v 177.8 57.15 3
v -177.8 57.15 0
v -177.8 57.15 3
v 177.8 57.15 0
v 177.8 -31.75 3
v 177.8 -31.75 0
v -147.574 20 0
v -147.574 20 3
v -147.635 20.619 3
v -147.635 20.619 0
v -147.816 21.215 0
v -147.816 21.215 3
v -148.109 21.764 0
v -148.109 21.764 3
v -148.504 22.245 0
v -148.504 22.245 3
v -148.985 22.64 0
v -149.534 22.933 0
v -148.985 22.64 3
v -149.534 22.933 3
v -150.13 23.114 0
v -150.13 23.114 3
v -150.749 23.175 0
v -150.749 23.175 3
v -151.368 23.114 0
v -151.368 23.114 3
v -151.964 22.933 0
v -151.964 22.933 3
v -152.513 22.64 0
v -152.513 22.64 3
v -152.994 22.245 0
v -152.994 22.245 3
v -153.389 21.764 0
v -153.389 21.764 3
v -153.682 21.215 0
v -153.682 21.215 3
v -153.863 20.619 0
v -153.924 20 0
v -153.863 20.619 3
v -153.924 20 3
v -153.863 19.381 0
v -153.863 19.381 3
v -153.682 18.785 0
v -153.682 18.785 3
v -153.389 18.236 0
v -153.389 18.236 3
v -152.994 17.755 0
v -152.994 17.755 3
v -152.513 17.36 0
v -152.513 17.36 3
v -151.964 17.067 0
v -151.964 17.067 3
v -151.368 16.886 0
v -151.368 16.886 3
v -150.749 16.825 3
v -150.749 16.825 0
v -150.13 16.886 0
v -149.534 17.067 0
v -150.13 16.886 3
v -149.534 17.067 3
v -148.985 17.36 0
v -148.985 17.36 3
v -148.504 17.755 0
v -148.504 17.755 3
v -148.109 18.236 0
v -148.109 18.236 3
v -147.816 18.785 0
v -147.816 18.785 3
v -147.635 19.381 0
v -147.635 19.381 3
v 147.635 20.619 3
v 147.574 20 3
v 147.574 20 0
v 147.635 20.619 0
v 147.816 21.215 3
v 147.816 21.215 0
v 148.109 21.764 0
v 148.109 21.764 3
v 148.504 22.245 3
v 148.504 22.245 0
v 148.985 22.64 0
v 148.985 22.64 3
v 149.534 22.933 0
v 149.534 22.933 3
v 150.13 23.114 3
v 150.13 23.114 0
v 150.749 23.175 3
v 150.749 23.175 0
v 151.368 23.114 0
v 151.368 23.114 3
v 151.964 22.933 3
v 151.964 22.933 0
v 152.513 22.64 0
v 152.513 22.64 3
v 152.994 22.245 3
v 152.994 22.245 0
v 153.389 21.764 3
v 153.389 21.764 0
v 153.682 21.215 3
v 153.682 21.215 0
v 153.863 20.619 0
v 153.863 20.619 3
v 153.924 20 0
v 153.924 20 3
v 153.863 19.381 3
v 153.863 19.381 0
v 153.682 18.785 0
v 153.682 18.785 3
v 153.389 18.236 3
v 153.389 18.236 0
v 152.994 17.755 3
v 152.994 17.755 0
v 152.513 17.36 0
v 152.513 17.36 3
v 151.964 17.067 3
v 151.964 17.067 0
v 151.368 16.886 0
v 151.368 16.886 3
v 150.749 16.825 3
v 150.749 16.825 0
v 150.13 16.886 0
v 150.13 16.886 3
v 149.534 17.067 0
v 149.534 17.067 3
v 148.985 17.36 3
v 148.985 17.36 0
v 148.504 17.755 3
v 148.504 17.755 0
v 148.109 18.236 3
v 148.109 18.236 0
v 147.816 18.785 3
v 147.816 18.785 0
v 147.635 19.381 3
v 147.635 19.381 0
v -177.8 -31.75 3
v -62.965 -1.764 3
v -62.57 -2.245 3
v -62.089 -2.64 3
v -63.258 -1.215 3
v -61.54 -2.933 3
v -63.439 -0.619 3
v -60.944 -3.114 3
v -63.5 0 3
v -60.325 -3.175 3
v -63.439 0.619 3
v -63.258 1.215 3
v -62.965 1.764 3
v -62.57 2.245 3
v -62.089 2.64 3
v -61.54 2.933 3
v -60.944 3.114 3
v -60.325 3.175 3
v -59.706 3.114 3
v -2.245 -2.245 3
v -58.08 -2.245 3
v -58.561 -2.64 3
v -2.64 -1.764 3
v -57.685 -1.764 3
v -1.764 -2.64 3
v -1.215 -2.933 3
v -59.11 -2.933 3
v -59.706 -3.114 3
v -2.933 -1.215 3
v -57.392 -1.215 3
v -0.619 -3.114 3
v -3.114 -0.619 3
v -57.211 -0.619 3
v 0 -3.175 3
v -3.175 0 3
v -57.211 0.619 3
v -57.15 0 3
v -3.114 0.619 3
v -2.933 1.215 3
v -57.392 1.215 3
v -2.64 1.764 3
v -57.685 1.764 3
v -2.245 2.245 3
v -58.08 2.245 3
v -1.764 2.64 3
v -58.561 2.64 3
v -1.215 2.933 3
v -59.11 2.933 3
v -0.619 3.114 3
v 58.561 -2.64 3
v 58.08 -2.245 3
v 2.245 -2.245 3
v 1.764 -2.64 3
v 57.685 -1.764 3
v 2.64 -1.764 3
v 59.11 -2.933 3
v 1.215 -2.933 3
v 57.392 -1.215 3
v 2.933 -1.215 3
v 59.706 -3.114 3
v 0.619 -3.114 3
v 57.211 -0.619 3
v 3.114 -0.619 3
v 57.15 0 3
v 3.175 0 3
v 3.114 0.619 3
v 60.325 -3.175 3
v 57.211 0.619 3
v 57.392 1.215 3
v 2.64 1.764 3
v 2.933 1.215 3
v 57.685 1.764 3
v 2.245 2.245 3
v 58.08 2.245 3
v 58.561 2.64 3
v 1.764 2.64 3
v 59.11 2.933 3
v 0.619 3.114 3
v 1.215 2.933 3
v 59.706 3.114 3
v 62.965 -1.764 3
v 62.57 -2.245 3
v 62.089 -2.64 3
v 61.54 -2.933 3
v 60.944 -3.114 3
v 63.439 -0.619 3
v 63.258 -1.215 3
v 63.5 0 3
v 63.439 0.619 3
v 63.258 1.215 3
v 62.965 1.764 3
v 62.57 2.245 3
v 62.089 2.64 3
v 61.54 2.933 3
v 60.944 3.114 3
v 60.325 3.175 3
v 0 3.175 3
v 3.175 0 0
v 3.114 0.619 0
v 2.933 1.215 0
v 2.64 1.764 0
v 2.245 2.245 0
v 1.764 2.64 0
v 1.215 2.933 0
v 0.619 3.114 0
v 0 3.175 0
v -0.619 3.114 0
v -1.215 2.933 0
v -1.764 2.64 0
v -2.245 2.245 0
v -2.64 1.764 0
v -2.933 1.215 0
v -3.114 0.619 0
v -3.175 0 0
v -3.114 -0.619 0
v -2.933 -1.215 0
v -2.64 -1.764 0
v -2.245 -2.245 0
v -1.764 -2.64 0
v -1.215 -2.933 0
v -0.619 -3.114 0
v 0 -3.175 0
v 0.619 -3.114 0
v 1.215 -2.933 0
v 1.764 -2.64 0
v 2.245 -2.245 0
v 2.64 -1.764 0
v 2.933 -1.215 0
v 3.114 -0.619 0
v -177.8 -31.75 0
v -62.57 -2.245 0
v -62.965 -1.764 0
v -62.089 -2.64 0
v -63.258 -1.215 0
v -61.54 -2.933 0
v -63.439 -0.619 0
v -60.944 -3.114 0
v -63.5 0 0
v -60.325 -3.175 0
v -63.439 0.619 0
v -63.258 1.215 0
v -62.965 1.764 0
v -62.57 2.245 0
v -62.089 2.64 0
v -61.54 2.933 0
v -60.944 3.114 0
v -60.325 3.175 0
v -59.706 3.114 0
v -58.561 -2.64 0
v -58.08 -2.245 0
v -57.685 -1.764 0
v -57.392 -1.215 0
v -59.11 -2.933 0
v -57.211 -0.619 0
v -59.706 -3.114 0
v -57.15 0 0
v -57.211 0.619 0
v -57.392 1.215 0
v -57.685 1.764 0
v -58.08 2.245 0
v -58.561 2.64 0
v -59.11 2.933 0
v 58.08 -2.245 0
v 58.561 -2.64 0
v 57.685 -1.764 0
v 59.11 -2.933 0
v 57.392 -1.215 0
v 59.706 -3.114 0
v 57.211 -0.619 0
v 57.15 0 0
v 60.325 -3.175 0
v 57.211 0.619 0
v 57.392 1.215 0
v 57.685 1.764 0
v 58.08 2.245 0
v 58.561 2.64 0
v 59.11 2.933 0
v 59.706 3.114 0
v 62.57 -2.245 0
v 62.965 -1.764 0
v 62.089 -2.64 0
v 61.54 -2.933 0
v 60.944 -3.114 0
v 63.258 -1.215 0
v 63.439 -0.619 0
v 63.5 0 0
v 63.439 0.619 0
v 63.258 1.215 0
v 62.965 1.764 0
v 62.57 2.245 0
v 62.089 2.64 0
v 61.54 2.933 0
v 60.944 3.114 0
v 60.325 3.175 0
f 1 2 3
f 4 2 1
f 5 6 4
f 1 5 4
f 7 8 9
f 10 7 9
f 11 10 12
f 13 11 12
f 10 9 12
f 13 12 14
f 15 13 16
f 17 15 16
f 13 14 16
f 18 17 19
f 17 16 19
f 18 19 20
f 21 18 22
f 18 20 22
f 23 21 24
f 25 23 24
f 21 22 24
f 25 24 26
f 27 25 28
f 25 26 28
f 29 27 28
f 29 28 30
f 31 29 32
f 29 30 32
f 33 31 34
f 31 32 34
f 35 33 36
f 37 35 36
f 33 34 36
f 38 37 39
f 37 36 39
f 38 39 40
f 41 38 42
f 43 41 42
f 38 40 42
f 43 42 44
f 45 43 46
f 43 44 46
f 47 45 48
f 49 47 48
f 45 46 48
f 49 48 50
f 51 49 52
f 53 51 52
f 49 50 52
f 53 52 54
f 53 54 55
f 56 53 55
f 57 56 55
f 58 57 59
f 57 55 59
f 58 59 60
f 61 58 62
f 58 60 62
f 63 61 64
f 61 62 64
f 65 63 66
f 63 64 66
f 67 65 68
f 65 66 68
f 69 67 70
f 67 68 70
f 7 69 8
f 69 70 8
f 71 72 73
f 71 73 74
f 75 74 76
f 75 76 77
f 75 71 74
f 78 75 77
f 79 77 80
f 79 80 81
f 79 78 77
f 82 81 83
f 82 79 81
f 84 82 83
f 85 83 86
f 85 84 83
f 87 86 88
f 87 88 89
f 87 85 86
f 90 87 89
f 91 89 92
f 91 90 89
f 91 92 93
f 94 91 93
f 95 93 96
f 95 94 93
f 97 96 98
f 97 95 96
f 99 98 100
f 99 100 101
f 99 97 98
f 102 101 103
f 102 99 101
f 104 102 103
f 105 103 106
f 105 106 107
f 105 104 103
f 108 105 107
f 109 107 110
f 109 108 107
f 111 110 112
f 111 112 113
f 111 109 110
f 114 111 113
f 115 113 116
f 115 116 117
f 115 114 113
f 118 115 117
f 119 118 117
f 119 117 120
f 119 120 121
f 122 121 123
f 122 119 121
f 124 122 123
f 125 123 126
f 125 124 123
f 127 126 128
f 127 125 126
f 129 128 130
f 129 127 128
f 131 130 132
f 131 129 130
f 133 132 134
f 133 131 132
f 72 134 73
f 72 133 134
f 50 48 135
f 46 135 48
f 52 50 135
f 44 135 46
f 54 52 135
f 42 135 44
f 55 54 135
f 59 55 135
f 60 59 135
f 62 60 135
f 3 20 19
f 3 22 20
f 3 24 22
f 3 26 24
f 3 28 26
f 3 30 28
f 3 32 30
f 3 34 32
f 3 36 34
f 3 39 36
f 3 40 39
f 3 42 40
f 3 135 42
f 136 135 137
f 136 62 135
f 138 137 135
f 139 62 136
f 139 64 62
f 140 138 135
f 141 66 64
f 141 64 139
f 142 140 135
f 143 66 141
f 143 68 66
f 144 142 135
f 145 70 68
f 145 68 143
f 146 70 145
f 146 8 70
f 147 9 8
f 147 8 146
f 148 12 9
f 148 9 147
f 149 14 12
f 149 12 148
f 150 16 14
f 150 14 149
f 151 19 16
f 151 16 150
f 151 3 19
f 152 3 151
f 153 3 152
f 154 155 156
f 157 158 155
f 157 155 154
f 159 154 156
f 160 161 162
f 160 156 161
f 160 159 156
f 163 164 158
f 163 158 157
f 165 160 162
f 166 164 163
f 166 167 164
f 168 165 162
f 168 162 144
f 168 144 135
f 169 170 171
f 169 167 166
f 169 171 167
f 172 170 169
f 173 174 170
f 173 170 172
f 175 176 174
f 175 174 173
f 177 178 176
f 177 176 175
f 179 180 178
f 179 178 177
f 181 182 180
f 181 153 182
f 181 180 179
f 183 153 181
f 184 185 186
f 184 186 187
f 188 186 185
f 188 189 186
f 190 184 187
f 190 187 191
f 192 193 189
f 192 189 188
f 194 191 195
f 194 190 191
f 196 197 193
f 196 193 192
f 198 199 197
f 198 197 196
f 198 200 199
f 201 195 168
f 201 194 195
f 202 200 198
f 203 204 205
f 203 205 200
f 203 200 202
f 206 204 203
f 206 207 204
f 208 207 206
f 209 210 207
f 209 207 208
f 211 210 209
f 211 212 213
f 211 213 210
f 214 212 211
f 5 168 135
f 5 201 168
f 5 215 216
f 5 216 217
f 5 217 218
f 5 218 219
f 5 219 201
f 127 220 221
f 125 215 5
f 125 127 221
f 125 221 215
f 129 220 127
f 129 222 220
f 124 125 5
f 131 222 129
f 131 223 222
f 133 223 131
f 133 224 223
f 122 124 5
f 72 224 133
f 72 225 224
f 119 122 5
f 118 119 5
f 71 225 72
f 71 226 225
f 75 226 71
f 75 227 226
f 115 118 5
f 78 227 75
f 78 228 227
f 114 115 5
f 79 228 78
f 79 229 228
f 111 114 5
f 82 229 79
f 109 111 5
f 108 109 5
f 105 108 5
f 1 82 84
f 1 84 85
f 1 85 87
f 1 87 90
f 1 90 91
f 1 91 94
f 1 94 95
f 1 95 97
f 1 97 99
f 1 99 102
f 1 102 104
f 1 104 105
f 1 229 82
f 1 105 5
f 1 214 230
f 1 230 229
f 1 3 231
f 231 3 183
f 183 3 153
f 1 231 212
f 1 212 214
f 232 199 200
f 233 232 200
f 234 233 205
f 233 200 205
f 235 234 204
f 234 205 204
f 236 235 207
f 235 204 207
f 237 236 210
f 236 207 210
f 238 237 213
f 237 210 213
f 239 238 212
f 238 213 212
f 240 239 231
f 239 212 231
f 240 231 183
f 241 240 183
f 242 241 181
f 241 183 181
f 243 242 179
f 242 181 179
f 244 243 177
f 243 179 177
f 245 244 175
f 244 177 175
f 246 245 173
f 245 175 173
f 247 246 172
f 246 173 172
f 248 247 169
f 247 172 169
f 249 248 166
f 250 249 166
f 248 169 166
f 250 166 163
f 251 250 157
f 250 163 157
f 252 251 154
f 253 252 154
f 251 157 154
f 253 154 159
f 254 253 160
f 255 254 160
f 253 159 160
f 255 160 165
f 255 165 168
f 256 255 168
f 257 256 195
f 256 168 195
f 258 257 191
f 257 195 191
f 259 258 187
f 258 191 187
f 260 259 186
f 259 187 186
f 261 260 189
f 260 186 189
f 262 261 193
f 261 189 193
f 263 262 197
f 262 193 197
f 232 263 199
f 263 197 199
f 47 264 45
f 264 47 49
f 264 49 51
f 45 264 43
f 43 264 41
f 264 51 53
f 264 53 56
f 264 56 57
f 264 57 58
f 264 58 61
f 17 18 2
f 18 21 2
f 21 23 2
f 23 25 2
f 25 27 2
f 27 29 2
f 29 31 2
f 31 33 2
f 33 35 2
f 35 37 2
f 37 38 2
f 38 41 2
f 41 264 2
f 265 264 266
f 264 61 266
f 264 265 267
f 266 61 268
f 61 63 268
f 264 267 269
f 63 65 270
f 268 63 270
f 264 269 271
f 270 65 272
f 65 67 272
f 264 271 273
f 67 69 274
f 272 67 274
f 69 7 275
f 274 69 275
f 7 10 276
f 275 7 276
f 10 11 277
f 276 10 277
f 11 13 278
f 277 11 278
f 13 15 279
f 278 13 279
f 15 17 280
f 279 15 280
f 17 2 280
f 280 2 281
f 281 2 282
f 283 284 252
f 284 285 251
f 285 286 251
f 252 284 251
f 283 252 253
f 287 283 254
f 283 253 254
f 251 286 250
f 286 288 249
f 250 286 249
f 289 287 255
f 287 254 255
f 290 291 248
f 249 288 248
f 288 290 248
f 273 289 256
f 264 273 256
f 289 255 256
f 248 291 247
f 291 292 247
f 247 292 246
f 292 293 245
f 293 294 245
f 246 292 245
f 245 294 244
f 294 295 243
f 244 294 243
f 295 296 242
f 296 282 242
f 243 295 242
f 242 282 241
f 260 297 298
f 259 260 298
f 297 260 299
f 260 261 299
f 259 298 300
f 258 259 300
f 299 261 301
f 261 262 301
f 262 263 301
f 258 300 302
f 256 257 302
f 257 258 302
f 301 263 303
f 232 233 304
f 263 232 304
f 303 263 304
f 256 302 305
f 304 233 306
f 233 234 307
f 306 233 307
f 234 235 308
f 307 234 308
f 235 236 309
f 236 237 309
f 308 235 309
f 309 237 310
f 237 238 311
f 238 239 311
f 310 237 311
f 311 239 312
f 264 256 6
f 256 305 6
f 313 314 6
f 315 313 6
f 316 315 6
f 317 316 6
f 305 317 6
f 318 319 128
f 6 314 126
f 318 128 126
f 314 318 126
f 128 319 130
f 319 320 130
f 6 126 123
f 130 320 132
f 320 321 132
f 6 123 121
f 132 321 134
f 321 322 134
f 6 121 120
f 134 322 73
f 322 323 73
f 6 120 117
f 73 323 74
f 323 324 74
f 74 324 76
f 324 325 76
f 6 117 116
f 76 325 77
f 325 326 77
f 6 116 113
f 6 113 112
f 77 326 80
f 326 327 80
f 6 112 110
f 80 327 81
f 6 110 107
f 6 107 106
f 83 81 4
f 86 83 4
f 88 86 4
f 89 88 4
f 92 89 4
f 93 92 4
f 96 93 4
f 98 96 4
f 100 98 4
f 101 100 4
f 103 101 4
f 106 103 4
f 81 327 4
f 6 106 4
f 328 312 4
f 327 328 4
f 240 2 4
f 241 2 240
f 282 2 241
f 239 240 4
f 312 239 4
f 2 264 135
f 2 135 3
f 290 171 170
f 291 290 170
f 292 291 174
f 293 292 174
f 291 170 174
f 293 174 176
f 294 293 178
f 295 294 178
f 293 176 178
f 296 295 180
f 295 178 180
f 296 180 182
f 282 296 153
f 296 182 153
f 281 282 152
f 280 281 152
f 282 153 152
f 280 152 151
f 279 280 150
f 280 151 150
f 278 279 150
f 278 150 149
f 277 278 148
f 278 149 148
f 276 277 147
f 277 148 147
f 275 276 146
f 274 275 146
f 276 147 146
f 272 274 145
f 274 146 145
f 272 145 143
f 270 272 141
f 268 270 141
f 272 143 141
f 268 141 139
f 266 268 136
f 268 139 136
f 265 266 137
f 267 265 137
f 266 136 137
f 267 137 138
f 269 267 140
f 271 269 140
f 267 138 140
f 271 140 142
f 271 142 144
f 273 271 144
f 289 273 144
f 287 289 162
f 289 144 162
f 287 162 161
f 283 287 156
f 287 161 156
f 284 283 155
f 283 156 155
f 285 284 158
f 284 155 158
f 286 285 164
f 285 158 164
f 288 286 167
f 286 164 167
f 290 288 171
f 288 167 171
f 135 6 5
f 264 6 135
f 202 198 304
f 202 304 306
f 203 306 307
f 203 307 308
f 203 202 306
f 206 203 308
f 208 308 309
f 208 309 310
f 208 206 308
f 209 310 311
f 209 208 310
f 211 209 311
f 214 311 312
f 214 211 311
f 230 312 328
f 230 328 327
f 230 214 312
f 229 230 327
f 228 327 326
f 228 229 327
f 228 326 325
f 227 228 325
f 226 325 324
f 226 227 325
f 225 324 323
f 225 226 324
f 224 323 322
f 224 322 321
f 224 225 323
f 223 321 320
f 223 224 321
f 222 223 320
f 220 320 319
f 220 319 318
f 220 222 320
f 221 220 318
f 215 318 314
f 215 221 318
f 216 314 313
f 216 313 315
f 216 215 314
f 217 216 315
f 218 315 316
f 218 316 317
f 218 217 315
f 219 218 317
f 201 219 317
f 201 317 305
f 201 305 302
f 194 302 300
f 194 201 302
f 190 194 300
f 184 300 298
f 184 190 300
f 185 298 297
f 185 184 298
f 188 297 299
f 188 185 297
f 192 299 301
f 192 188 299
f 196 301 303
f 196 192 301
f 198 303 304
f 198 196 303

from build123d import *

# Parameters (mm, degrees)
SKETCH1_W           = 355.6
SKETCH1_H           = 114.3
BOSS_EXTRUDE1_DEPTH = 3
SKETCH3_R           = 3.175
CUT_EXTRUDE1_DEPTH  = 3
CUT_EXTRUDE2_REACH  = 188.783
SKETCH4_W           = 355.6
SKETCH4_H           = 25.4


with BuildPart() as part:
    # Sketch1 → Boss-Extrude1 (new body)
    with BuildSketch(Plane.XY):
        Rectangle(SKETCH1_W, SKETCH1_H)
    extrude(amount=BOSS_EXTRUDE1_DEPTH)

    # Sketch3 → Cut-Extrude1 (cut)
    with BuildSketch(Plane.XY.offset(3)):
        with Locations((-60.325, 0)):
            Circle(SKETCH3_R)
        Circle(SKETCH3_R)
        with Locations((-150.749, 20)):
            Circle(SKETCH3_R)
    cut_extrude1 = extrude(amount=-CUT_EXTRUDE1_DEPTH, mode=Mode.SUBTRACT)

    # Mirror3: Cut-Extrude1 across plane
    add(cut_extrude1.mirror(Plane(origin=(0, 0, 0), x_dir=(0, 0, 1), z_dir=(1, 0, 0))), mode=Mode.SUBTRACT)

    # Sketch4 → Cut-Extrude2 (cut, up to next)
    with BuildSketch(Plane(origin=(0, 0, 0), x_dir=(-1, 0, 0), z_dir=(0, 0, -1)), mode=Mode.PRIVATE) as cut_extrude2_sk1:
        with Locations((0, -44.45)):
            Rectangle(SKETCH4_W, SKETCH4_H)
    cut_extrude2_tool1 = extrude(cut_extrude2_sk1.sketch, amount=-CUT_EXTRUDE2_REACH, mode=Mode.PRIVATE) & part.part
    add(cut_extrude2_tool1.solids().sort_by_distance((0, -44.45, 0))[0], mode=Mode.SUBTRACT)


solid = part.part
